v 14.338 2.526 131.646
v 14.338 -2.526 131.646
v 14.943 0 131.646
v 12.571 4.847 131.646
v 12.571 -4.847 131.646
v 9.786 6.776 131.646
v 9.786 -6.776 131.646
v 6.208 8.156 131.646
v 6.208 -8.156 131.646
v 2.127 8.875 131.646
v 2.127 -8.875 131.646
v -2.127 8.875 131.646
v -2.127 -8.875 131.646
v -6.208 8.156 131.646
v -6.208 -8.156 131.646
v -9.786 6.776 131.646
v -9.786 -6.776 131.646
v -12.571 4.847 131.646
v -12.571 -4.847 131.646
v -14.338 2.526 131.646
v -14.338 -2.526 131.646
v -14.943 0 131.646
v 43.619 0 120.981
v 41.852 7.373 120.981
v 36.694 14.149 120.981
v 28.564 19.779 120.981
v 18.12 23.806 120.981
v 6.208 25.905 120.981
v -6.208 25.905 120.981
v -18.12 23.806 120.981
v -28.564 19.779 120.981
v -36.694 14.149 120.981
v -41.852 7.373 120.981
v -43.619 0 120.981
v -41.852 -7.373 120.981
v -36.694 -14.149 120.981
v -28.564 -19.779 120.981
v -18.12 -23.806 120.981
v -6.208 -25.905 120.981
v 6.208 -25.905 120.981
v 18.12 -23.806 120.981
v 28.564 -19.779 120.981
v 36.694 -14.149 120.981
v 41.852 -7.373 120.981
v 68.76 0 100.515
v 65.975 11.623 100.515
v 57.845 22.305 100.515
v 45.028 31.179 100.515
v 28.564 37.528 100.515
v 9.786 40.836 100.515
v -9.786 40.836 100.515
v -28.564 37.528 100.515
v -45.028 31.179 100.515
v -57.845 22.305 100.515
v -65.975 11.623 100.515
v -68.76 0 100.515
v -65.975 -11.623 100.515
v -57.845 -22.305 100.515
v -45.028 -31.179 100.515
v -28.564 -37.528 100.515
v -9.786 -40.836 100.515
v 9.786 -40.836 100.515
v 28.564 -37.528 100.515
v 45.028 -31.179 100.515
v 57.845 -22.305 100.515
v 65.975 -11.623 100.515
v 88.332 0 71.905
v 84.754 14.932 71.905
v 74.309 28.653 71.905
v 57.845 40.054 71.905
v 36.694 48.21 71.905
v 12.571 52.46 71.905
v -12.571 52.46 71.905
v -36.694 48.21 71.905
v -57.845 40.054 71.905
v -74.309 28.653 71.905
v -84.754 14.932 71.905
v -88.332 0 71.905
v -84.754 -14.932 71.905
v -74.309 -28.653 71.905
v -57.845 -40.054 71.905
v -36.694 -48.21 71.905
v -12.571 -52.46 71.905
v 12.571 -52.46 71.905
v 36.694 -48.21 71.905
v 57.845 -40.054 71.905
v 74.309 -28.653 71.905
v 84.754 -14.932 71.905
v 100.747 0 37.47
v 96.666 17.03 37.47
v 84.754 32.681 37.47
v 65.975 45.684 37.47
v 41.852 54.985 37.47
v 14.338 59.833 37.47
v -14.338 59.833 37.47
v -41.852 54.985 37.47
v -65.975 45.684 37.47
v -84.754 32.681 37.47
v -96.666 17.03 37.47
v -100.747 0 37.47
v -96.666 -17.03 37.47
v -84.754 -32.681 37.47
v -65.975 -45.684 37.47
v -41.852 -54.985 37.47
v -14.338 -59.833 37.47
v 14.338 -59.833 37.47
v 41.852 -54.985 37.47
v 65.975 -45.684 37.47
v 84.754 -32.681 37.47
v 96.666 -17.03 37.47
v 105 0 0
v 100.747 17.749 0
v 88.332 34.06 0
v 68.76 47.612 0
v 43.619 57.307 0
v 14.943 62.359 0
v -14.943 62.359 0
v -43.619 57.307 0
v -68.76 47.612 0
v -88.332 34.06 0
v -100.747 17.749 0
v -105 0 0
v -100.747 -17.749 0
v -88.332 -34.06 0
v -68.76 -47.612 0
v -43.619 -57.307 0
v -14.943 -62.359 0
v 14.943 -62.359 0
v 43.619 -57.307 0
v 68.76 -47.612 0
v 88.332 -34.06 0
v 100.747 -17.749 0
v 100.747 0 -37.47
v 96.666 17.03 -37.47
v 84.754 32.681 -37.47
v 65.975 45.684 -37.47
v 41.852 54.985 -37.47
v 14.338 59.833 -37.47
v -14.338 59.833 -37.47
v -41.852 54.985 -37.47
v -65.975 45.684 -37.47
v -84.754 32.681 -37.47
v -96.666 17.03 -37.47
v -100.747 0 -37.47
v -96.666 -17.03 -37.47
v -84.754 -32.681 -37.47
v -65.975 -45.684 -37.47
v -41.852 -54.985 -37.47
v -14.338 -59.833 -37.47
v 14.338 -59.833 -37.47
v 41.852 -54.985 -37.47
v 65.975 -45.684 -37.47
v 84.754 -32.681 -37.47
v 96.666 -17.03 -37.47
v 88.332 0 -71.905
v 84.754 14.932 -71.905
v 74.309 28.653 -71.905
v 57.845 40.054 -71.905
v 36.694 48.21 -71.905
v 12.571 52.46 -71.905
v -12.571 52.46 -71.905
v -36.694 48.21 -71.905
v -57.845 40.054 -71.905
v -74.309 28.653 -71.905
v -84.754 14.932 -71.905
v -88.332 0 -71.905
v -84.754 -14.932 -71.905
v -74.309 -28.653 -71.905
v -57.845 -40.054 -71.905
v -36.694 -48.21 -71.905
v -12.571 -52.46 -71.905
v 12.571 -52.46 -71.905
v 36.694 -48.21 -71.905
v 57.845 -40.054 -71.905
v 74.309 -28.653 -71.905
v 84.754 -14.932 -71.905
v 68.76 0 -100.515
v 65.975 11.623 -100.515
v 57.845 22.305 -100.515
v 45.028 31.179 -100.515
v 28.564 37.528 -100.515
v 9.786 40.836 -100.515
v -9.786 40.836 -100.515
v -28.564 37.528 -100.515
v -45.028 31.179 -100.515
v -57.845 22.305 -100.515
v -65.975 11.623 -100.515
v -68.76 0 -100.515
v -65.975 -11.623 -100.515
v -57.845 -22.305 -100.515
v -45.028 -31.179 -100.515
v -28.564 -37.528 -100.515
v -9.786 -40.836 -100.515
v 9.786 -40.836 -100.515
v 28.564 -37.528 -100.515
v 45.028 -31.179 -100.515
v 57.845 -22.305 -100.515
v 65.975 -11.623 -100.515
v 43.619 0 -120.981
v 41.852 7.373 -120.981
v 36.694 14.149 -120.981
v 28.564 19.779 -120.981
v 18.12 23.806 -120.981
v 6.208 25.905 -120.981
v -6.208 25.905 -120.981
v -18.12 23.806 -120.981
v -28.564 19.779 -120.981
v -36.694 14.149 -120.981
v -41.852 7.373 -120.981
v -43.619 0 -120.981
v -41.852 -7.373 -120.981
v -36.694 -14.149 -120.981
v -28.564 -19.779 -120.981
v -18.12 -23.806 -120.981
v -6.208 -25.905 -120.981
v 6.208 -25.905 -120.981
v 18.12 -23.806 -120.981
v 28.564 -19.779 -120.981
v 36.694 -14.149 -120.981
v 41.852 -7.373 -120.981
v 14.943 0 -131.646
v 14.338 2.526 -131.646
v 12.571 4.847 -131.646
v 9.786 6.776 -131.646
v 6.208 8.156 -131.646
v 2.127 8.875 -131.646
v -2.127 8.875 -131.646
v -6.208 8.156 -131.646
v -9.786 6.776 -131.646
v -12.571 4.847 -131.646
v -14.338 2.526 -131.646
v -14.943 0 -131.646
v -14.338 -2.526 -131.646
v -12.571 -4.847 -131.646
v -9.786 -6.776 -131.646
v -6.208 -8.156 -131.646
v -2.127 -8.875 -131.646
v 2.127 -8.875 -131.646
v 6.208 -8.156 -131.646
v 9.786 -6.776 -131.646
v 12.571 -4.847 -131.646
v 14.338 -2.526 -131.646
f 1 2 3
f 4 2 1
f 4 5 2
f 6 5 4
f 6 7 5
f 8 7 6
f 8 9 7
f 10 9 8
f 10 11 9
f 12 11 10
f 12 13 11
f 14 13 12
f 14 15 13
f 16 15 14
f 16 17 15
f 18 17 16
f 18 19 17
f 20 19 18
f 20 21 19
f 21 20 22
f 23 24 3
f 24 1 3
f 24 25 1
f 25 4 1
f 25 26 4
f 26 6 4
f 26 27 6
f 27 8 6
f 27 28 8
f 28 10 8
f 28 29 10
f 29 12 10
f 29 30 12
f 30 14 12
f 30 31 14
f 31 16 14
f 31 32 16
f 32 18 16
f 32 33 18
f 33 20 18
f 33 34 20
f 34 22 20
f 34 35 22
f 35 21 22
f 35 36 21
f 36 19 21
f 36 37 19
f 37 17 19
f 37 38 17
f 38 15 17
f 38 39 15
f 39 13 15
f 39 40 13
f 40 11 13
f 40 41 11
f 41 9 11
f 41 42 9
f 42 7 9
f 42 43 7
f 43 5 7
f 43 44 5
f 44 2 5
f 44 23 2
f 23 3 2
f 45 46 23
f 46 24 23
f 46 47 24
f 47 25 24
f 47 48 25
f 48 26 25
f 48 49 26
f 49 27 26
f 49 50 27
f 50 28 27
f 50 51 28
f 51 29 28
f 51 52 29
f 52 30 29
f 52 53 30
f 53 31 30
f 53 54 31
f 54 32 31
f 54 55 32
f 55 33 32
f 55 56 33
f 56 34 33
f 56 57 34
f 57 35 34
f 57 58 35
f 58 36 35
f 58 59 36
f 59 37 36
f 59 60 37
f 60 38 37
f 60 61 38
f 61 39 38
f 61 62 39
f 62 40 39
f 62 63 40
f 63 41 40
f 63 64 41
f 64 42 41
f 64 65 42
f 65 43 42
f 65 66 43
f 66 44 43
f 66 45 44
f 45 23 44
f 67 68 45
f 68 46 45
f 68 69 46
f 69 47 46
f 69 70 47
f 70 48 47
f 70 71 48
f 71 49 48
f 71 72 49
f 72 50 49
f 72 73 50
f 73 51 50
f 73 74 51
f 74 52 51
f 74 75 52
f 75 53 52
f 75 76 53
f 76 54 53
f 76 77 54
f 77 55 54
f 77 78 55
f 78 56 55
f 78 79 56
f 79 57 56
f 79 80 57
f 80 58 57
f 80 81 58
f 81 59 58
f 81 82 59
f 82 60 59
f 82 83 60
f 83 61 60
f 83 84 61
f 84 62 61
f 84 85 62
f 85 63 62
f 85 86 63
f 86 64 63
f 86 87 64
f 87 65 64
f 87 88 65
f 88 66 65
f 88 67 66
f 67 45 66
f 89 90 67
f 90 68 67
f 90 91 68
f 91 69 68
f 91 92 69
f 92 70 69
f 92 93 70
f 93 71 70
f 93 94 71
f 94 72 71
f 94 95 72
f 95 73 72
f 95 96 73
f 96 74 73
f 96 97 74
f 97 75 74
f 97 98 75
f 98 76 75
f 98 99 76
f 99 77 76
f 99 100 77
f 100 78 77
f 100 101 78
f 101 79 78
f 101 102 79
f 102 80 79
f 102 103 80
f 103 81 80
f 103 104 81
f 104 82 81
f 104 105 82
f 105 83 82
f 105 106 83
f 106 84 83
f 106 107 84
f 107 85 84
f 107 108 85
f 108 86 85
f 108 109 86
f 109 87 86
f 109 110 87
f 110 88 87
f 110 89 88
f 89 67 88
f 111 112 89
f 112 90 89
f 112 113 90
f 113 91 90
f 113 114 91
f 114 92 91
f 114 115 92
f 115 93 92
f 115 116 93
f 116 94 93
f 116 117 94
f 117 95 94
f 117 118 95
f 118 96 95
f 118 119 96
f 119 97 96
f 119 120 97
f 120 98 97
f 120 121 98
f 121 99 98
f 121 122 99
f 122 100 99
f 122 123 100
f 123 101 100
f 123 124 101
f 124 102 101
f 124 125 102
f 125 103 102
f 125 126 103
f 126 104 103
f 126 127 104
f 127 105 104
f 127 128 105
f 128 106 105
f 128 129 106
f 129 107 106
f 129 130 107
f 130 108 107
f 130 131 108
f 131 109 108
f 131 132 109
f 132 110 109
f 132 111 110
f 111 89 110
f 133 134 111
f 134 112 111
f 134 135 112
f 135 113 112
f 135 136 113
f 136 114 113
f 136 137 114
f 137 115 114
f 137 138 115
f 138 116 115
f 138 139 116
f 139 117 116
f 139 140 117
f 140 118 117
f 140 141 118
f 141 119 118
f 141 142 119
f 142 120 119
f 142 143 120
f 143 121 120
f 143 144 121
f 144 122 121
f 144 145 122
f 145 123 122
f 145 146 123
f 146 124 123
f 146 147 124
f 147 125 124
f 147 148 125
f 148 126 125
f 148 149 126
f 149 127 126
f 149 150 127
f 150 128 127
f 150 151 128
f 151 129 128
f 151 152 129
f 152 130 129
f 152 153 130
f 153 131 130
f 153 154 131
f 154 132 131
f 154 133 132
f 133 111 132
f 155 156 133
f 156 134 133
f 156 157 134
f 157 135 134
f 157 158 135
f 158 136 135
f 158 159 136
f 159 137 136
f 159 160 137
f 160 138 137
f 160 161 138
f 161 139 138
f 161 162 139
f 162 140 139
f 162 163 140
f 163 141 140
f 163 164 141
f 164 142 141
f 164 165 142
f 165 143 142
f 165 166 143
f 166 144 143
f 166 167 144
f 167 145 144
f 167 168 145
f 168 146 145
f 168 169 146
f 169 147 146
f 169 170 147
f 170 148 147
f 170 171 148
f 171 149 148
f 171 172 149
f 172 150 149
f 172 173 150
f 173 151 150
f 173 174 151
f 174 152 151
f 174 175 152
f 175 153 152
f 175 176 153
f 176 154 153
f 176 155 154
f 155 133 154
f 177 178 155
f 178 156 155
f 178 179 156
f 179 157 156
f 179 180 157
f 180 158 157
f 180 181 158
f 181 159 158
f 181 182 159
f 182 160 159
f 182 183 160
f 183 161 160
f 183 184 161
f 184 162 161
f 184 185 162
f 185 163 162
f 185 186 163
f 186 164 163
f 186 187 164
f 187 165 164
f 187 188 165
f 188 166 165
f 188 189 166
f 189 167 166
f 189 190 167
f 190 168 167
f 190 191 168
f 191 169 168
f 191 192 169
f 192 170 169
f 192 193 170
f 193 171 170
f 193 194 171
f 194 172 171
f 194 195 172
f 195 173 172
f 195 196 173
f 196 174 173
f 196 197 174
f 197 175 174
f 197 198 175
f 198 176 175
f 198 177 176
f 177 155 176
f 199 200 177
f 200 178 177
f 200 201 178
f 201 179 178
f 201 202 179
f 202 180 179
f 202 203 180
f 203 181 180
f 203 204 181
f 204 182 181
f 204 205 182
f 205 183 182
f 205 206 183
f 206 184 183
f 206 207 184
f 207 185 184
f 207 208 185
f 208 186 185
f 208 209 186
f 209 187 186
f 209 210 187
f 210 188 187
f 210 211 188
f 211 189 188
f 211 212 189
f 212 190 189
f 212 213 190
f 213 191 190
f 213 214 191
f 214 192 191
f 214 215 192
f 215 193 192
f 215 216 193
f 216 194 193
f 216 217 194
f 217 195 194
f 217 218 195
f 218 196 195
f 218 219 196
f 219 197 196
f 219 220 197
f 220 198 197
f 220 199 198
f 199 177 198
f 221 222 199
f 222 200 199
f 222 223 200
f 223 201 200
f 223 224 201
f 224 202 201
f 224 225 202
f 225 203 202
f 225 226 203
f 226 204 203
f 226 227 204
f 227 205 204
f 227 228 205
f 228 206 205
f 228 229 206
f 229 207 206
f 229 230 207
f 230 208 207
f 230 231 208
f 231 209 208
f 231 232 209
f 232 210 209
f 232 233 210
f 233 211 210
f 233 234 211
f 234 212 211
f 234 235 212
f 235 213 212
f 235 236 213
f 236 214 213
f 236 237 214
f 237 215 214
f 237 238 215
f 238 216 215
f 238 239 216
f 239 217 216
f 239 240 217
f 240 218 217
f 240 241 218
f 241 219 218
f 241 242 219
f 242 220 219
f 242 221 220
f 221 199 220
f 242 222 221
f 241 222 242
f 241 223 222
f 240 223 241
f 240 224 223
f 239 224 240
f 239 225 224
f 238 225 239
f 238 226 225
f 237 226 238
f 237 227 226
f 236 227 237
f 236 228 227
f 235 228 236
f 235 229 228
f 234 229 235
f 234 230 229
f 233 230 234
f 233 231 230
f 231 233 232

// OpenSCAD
// Generated by SolidPython 1.0.1 on 2020-07-29 00:46:52


scale(v = [15, 9, 19]) {
	sphere(r = 7);
}
/***********************************************
*********      SolidPython code:      **********
************************************************
 
# import packages: SolidPython
from solid import *
from solid.utils import *
from itertools import chain, combinations, permutations


class Resize:

    def __init__(self, scad_file):
        self.scad_file = scad_file
        #self.scad_file = import_scad(scad_file)
        # cone/cylinder param:
        self.r1 = 0
        self.r2 = 0
        self.h = 0
        # rectangular prism param:
        self.w = 0
        self.l = 0
        # ellipse param:
        self.r = 0

    # import OpenScad code (file name corresponds to shape)


    # classify shape + parameters
    def assign(self, param1, param2, param3):
        if self.scad_file == 'cone.scad':
            self.r1 = param1
            self.r2 = param2
            self.h = param3
        elif self.scad_file == 'cylinder.scad':
            self.r1 = param1
            self.r2 = param2
            self.h = param3
        elif self.scad_file == 'rectangularPrism.scad':
            self.h = param1
            self.l = param2
            self.w = param3
        else:
            self.r = param1
            self.h = param2

    # resize parameters
    def iterate(self):
        x = range(3, 20, 2)
        i = 1
        if self.scad_file == 'cone.scad':
            tempList = list(permutations(x, 2))
            for temp in tempList:
                param1 = temp[0]
                param2 = temp[1]
                filepath = 'produced_scad_files/' + 'cone' + str(param1) + '_' + str(param2) + '_' + '.scad'
                scad_render_to_file(cylinder(h=param1, r1=param2, r2=0), filepath)

        elif self.scad_file == 'cylinder.scad':
            tempList = list(permutations(x, 3))
            for temp in tempList:
                param1 = temp[0]
                param2 = temp[1]
                filepath = 'produced_scad_files/' + 'cylinder' + str(param1) + '_' + str(param2) + '_' + '.scad'
                scad_render_to_file(cylinder(h=param1, r1=param2, r2=param2), filepath)

        elif self.scad_file == 'rectangularPrism.scad':
            tempList = list(permutations(x, 3))
            for temp in tempList:
                param1 = temp[0]
                param2 = temp[1]
                param3 = temp[2]
                filepath = 'produced_scad_files/' + 'rectangularPrism' + str(param1) + '_' + str(param2) + '_' + str(
                    param3) + '.scad'
                scad_render_to_file(cube(size=(param1, param2, param3)), filepath)

        elif self.scad_file == 'ellipse.scad':
            tempList = list(permutations(x, 4))
            for temp in tempList:
                param1 = temp[0]
                param2 = temp[1]
                param3 = temp[2]
                param4 = temp[3]
                filepath = 'produced_scad_files/' + 'ellipse' + str(param1) + '_' + str(param2) + '_' + str(param3) + '_' + str(param4) + '.scad'
                scad_render_to_file(scale([param1, param2, param3])(sphere(r=param4)), filepath)

    def render_to_scadfile(self):
        scad_render_to_file(scad, 'example.scad') 
 
************************************************/
